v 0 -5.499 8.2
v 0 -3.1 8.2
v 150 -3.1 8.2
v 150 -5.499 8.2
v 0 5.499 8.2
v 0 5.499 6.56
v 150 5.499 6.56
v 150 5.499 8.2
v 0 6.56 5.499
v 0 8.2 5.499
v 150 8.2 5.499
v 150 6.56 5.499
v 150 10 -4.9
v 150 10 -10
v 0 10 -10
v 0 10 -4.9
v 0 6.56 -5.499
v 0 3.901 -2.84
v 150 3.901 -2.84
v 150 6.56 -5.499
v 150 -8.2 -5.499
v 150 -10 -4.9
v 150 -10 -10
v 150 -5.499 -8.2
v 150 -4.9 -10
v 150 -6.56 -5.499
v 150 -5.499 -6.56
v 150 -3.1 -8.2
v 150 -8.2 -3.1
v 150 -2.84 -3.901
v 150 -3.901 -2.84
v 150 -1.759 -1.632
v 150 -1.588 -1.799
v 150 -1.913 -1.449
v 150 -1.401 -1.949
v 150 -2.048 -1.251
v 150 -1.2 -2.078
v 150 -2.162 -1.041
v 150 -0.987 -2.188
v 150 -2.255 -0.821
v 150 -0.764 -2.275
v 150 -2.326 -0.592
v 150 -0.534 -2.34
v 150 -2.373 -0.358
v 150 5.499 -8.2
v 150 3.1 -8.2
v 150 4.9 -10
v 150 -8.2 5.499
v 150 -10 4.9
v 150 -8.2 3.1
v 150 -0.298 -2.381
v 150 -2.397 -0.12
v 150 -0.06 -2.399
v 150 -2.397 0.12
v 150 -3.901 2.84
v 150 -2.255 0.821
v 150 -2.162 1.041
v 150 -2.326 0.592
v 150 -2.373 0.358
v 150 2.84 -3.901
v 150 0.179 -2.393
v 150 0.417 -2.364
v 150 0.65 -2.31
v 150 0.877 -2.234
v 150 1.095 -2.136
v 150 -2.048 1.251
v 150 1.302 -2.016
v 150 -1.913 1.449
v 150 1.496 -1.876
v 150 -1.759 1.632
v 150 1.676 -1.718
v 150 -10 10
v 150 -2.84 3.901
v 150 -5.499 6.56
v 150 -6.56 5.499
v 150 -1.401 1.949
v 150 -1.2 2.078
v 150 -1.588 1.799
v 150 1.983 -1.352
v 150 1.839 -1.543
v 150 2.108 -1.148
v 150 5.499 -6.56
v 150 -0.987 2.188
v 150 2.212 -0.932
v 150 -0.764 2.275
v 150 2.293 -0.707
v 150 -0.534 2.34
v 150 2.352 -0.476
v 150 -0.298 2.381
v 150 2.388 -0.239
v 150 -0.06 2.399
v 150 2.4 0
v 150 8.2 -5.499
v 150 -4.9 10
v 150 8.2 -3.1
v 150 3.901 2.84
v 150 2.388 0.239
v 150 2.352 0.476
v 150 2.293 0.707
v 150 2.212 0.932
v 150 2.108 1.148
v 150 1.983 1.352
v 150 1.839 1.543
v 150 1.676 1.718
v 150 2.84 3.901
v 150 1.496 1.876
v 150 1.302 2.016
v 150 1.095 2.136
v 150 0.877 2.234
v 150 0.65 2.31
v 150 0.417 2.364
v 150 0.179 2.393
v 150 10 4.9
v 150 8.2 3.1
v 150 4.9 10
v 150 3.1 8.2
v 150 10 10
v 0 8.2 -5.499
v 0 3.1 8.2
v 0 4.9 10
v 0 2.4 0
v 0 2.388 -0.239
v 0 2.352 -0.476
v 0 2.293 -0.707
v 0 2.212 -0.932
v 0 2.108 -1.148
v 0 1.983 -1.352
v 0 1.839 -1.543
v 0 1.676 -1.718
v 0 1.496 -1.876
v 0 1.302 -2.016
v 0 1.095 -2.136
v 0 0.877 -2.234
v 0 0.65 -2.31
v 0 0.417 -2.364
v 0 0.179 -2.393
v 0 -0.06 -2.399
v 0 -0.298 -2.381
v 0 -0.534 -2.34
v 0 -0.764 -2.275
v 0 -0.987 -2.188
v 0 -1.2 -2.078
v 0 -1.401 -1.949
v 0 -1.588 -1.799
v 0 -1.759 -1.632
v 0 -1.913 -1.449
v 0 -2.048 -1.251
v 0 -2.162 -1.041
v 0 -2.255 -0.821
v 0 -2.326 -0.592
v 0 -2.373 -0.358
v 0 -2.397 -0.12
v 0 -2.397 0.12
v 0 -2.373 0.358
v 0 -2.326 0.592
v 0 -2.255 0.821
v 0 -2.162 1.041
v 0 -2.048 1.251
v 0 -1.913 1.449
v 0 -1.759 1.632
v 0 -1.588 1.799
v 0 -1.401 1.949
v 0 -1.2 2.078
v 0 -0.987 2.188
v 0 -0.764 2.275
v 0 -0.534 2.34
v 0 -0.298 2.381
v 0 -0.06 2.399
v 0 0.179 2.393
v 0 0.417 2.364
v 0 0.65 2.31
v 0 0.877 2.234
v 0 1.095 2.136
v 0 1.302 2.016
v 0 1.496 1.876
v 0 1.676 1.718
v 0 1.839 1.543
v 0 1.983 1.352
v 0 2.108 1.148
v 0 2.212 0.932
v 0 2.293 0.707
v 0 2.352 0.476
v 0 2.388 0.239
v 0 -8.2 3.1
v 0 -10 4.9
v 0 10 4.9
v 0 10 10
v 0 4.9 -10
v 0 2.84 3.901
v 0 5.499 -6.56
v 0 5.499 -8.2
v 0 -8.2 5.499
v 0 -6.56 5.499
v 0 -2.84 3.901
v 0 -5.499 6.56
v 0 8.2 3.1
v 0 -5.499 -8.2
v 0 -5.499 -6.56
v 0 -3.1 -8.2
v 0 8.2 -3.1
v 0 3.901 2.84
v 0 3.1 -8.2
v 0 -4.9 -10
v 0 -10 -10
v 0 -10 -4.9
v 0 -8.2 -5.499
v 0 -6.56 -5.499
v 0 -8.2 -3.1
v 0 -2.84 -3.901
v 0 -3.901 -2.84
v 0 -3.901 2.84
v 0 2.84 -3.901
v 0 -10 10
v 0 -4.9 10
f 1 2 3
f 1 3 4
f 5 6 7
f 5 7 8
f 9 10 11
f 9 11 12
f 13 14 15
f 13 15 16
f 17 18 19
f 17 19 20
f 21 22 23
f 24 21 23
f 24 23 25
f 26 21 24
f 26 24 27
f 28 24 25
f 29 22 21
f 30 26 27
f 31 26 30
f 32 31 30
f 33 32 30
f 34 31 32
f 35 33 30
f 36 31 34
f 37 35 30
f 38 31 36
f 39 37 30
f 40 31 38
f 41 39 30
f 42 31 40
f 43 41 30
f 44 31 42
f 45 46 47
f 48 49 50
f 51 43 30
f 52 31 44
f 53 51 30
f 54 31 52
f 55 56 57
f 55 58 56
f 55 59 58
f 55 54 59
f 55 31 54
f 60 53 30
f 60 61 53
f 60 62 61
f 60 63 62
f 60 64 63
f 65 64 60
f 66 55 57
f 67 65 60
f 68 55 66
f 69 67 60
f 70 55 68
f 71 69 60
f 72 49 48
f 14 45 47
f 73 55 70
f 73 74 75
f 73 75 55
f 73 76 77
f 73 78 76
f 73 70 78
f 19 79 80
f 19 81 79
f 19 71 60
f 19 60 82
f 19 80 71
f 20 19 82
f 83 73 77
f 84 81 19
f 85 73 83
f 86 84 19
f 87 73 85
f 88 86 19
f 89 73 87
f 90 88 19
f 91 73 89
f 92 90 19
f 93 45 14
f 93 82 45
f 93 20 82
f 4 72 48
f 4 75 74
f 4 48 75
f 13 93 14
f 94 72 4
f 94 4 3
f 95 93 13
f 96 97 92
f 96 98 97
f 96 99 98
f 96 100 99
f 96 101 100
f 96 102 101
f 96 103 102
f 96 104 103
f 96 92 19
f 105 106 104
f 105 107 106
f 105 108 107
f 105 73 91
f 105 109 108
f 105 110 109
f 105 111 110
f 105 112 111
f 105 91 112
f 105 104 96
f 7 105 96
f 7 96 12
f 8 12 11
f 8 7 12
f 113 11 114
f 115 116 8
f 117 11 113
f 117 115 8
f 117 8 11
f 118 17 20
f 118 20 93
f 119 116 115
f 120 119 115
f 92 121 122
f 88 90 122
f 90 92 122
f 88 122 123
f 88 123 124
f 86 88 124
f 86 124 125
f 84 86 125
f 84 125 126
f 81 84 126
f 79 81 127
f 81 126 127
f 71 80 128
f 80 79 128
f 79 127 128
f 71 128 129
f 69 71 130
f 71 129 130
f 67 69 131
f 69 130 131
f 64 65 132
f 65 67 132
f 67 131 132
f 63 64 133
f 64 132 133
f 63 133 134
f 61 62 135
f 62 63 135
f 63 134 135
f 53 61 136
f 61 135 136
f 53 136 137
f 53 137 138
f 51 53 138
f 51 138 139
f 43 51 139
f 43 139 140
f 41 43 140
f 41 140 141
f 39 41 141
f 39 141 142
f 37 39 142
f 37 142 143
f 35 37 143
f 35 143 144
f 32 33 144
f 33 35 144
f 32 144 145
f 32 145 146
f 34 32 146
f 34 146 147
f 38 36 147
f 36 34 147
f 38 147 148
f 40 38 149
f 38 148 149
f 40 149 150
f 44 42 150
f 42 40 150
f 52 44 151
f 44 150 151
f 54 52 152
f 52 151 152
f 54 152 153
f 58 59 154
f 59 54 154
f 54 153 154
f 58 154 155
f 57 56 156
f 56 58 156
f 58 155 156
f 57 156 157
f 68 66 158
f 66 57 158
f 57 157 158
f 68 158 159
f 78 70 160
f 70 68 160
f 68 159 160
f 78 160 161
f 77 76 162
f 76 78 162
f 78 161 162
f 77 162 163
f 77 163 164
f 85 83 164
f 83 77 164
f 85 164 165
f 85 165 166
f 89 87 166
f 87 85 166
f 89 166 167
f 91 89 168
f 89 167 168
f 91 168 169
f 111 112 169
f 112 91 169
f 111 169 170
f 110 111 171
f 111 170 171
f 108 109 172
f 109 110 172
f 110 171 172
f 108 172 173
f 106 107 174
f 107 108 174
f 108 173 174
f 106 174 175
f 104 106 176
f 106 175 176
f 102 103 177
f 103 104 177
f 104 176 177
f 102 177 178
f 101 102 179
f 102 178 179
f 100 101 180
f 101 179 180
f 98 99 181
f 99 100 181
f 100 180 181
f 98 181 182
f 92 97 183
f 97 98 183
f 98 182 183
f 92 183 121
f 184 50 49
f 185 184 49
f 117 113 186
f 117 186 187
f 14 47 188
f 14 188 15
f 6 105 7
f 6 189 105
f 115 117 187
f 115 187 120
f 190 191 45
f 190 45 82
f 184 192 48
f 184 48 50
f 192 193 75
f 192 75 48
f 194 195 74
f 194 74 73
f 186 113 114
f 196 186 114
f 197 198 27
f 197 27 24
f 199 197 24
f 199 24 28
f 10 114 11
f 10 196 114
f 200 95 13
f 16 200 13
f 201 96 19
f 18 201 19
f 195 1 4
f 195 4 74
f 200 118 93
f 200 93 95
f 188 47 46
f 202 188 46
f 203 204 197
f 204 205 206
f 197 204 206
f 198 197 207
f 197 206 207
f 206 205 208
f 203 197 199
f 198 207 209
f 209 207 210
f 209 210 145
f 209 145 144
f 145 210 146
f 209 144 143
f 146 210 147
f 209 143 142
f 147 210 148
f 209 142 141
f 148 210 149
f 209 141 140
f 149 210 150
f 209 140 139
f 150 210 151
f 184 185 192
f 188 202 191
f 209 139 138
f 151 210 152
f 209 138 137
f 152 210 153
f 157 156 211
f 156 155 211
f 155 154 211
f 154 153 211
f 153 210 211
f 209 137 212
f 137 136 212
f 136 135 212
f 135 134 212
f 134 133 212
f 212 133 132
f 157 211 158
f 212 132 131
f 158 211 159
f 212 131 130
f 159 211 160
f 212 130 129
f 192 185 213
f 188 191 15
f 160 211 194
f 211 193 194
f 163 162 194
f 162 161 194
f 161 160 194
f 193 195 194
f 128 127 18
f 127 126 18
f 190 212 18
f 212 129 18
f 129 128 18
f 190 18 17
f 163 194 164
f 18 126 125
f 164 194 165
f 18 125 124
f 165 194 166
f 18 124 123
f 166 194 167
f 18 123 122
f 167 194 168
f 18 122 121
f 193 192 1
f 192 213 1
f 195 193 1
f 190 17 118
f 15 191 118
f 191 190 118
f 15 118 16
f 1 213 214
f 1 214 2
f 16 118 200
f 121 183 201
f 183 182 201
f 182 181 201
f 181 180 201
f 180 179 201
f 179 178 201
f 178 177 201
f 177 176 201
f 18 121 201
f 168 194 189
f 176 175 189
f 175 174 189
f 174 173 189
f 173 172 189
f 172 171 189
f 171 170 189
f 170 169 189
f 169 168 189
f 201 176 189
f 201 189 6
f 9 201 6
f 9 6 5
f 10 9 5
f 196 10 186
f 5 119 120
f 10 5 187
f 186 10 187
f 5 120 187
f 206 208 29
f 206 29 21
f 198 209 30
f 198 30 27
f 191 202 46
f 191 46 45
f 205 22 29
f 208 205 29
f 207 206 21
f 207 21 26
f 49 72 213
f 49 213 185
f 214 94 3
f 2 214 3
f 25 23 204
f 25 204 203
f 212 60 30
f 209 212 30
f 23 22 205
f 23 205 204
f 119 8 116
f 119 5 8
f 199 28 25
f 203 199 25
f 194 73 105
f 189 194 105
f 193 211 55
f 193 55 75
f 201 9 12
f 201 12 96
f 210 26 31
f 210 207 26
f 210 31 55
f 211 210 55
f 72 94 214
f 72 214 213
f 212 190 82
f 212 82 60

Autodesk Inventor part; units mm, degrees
ref_plane "YZ Plane" through (0, 0, 0) normal (1, 0, 0) x (0, 1, 0)
ref_plane "XZ Plane" through (0, 0, 0) normal (0, 1, 0) x (-1, 0, 0)
ref_plane "XY Plane" through (0, 0, 0) normal (0, 0, 1) x (1, 0, 0)
sketch "Sketch1" plane through (0, 0, 0) normal (1, 0, 0) x (0, 1, 0)
  line L0 (-10, -10) -> (10, -10)
  line L1 (10, -10) -> (10, 10)
  line L2 (10, 10) -> (-10, 10)
  line L3 (-10, 10) -> (-10, -10)
  line L4 (-10, -10) -> (10, 10) construction
  line L5 (10, -10) -> (-10, 10) construction
  line L6 (10, 4.9) -> (8.2, 3.1)
  line L7 (8.2, 3.1) -> (8.2, 5.4993)
  line L8 (8.2, 5.4993) -> (6.56, 5.4993)
  line L9 (6.56, 5.4993) -> (3.9007, 2.84)
  line L10 (3.9007, -2.84) -> (6.56, -5.4993)
  line L11 (6.56, -5.4993) -> (8.2, -5.4993)
  line L12 (8.2, -5.4993) -> (8.2, -3.1)
  line L13 (8.2, -3.1) -> (10, -4.9)
  circle A0 centre (0, 0) radius 2.4
  line L14 (3.9007, 2.84) -> (3.9007, -2.84)
  line L15 (3.9007, 0) -> (0, 0) construction
  line L16 (5.4993, 6.56) -> (5.4993, 8.2)
  line L17 (2.84, 3.9007) -> (5.4993, 6.56)
  line L18 (-2.84, 3.9007) -> (2.84, 3.9007)
  line L19 (-5.4993, 6.56) -> (-2.84, 3.9007)
  line L20 (-5.4993, 8.2) -> (-5.4993, 6.56)
  line L21 (-3.1, 8.2) -> (-5.4993, 8.2)
  line L22 (-4.9, 10) -> (-3.1, 8.2)
  line L23 (3.1, 8.2) -> (4.9, 10)
  line L24 (5.4993, 8.2) -> (3.1, 8.2)
  line L25 (-6.56, 5.4993) -> (-8.2, 5.4993)
  line L26 (-3.9007, 2.84) -> (-6.56, 5.4993)
  line L27 (-3.9007, -2.84) -> (-3.9007, 2.84)
  line L28 (-6.56, -5.4993) -> (-3.9007, -2.84)
  line L29 (-8.2, -5.4993) -> (-6.56, -5.4993)
  line L30 (-8.2, -3.1) -> (-8.2, -5.4993)
  line L31 (-10, -4.9) -> (-8.2, -3.1)
  line L32 (-8.2, 3.1) -> (-10, 4.9)
  line L33 (-8.2, 5.4993) -> (-8.2, 3.1)
  line L34 (-5.4993, -6.56) -> (-5.4993, -8.2)
  line L35 (-2.84, -3.9007) -> (-5.4993, -6.56)
  line L36 (2.84, -3.9007) -> (-2.84, -3.9007)
  line L37 (5.4993, -6.56) -> (2.84, -3.9007)
  line L38 (5.4993, -8.2) -> (5.4993, -6.56)
  line L39 (3.1, -8.2) -> (5.4993, -8.2)
  line L40 (4.9, -10) -> (3.1, -8.2)
  line L41 (-3.1, -8.2) -> (-4.9, -10)
  line L42 (-5.4993, -8.2) -> (-3.1, -8.2)
  point P0 (0, 3.9007)
  point P1 (-3.9007, 0)
  point P2 (0, -3.9007)
  dimension "d0" = 20
  dimension "d1" = 20
  dimension "d2" = 45
  dimension "d3" = 45
  dimension "d4" = 1.8
  dimension "d5" = 1.8
  dimension "d6" = 4.8
  dimension "d7" = 1.64
  dimension "d8" = 1.64
  dimension "d11" = 5.68
  dimension "d12" = 3.1
  dimension "d13" = 3.1
  dimension "d16" = 360
  dimension "d18" = 1.5
  dimension "d19" = 2.3993
  dimension "d20" = 2.3993
extrude "Extrusion1" add sketch "Sketch1" along normal blind 150 contours L3 L31 L30 L29 L28 L27 L26 L25 L33 L32 L2 L22 L21 L20 L19 L18 L17 L16 L24 L23 L1 L6 L7 L8 L9 L14 L10 L11 L12 L13 L0 L40 L39 L38 L37 L36 L35 L34 L42 L41
equation "\"d3\" = d2"
equation "\"d5\" = d4"
equation "\"d8\" = d7"
equation "\"d13\" = d12"
equation "\"d19\" = d20"
properties part number "2020" material "Aluminum 6061"
